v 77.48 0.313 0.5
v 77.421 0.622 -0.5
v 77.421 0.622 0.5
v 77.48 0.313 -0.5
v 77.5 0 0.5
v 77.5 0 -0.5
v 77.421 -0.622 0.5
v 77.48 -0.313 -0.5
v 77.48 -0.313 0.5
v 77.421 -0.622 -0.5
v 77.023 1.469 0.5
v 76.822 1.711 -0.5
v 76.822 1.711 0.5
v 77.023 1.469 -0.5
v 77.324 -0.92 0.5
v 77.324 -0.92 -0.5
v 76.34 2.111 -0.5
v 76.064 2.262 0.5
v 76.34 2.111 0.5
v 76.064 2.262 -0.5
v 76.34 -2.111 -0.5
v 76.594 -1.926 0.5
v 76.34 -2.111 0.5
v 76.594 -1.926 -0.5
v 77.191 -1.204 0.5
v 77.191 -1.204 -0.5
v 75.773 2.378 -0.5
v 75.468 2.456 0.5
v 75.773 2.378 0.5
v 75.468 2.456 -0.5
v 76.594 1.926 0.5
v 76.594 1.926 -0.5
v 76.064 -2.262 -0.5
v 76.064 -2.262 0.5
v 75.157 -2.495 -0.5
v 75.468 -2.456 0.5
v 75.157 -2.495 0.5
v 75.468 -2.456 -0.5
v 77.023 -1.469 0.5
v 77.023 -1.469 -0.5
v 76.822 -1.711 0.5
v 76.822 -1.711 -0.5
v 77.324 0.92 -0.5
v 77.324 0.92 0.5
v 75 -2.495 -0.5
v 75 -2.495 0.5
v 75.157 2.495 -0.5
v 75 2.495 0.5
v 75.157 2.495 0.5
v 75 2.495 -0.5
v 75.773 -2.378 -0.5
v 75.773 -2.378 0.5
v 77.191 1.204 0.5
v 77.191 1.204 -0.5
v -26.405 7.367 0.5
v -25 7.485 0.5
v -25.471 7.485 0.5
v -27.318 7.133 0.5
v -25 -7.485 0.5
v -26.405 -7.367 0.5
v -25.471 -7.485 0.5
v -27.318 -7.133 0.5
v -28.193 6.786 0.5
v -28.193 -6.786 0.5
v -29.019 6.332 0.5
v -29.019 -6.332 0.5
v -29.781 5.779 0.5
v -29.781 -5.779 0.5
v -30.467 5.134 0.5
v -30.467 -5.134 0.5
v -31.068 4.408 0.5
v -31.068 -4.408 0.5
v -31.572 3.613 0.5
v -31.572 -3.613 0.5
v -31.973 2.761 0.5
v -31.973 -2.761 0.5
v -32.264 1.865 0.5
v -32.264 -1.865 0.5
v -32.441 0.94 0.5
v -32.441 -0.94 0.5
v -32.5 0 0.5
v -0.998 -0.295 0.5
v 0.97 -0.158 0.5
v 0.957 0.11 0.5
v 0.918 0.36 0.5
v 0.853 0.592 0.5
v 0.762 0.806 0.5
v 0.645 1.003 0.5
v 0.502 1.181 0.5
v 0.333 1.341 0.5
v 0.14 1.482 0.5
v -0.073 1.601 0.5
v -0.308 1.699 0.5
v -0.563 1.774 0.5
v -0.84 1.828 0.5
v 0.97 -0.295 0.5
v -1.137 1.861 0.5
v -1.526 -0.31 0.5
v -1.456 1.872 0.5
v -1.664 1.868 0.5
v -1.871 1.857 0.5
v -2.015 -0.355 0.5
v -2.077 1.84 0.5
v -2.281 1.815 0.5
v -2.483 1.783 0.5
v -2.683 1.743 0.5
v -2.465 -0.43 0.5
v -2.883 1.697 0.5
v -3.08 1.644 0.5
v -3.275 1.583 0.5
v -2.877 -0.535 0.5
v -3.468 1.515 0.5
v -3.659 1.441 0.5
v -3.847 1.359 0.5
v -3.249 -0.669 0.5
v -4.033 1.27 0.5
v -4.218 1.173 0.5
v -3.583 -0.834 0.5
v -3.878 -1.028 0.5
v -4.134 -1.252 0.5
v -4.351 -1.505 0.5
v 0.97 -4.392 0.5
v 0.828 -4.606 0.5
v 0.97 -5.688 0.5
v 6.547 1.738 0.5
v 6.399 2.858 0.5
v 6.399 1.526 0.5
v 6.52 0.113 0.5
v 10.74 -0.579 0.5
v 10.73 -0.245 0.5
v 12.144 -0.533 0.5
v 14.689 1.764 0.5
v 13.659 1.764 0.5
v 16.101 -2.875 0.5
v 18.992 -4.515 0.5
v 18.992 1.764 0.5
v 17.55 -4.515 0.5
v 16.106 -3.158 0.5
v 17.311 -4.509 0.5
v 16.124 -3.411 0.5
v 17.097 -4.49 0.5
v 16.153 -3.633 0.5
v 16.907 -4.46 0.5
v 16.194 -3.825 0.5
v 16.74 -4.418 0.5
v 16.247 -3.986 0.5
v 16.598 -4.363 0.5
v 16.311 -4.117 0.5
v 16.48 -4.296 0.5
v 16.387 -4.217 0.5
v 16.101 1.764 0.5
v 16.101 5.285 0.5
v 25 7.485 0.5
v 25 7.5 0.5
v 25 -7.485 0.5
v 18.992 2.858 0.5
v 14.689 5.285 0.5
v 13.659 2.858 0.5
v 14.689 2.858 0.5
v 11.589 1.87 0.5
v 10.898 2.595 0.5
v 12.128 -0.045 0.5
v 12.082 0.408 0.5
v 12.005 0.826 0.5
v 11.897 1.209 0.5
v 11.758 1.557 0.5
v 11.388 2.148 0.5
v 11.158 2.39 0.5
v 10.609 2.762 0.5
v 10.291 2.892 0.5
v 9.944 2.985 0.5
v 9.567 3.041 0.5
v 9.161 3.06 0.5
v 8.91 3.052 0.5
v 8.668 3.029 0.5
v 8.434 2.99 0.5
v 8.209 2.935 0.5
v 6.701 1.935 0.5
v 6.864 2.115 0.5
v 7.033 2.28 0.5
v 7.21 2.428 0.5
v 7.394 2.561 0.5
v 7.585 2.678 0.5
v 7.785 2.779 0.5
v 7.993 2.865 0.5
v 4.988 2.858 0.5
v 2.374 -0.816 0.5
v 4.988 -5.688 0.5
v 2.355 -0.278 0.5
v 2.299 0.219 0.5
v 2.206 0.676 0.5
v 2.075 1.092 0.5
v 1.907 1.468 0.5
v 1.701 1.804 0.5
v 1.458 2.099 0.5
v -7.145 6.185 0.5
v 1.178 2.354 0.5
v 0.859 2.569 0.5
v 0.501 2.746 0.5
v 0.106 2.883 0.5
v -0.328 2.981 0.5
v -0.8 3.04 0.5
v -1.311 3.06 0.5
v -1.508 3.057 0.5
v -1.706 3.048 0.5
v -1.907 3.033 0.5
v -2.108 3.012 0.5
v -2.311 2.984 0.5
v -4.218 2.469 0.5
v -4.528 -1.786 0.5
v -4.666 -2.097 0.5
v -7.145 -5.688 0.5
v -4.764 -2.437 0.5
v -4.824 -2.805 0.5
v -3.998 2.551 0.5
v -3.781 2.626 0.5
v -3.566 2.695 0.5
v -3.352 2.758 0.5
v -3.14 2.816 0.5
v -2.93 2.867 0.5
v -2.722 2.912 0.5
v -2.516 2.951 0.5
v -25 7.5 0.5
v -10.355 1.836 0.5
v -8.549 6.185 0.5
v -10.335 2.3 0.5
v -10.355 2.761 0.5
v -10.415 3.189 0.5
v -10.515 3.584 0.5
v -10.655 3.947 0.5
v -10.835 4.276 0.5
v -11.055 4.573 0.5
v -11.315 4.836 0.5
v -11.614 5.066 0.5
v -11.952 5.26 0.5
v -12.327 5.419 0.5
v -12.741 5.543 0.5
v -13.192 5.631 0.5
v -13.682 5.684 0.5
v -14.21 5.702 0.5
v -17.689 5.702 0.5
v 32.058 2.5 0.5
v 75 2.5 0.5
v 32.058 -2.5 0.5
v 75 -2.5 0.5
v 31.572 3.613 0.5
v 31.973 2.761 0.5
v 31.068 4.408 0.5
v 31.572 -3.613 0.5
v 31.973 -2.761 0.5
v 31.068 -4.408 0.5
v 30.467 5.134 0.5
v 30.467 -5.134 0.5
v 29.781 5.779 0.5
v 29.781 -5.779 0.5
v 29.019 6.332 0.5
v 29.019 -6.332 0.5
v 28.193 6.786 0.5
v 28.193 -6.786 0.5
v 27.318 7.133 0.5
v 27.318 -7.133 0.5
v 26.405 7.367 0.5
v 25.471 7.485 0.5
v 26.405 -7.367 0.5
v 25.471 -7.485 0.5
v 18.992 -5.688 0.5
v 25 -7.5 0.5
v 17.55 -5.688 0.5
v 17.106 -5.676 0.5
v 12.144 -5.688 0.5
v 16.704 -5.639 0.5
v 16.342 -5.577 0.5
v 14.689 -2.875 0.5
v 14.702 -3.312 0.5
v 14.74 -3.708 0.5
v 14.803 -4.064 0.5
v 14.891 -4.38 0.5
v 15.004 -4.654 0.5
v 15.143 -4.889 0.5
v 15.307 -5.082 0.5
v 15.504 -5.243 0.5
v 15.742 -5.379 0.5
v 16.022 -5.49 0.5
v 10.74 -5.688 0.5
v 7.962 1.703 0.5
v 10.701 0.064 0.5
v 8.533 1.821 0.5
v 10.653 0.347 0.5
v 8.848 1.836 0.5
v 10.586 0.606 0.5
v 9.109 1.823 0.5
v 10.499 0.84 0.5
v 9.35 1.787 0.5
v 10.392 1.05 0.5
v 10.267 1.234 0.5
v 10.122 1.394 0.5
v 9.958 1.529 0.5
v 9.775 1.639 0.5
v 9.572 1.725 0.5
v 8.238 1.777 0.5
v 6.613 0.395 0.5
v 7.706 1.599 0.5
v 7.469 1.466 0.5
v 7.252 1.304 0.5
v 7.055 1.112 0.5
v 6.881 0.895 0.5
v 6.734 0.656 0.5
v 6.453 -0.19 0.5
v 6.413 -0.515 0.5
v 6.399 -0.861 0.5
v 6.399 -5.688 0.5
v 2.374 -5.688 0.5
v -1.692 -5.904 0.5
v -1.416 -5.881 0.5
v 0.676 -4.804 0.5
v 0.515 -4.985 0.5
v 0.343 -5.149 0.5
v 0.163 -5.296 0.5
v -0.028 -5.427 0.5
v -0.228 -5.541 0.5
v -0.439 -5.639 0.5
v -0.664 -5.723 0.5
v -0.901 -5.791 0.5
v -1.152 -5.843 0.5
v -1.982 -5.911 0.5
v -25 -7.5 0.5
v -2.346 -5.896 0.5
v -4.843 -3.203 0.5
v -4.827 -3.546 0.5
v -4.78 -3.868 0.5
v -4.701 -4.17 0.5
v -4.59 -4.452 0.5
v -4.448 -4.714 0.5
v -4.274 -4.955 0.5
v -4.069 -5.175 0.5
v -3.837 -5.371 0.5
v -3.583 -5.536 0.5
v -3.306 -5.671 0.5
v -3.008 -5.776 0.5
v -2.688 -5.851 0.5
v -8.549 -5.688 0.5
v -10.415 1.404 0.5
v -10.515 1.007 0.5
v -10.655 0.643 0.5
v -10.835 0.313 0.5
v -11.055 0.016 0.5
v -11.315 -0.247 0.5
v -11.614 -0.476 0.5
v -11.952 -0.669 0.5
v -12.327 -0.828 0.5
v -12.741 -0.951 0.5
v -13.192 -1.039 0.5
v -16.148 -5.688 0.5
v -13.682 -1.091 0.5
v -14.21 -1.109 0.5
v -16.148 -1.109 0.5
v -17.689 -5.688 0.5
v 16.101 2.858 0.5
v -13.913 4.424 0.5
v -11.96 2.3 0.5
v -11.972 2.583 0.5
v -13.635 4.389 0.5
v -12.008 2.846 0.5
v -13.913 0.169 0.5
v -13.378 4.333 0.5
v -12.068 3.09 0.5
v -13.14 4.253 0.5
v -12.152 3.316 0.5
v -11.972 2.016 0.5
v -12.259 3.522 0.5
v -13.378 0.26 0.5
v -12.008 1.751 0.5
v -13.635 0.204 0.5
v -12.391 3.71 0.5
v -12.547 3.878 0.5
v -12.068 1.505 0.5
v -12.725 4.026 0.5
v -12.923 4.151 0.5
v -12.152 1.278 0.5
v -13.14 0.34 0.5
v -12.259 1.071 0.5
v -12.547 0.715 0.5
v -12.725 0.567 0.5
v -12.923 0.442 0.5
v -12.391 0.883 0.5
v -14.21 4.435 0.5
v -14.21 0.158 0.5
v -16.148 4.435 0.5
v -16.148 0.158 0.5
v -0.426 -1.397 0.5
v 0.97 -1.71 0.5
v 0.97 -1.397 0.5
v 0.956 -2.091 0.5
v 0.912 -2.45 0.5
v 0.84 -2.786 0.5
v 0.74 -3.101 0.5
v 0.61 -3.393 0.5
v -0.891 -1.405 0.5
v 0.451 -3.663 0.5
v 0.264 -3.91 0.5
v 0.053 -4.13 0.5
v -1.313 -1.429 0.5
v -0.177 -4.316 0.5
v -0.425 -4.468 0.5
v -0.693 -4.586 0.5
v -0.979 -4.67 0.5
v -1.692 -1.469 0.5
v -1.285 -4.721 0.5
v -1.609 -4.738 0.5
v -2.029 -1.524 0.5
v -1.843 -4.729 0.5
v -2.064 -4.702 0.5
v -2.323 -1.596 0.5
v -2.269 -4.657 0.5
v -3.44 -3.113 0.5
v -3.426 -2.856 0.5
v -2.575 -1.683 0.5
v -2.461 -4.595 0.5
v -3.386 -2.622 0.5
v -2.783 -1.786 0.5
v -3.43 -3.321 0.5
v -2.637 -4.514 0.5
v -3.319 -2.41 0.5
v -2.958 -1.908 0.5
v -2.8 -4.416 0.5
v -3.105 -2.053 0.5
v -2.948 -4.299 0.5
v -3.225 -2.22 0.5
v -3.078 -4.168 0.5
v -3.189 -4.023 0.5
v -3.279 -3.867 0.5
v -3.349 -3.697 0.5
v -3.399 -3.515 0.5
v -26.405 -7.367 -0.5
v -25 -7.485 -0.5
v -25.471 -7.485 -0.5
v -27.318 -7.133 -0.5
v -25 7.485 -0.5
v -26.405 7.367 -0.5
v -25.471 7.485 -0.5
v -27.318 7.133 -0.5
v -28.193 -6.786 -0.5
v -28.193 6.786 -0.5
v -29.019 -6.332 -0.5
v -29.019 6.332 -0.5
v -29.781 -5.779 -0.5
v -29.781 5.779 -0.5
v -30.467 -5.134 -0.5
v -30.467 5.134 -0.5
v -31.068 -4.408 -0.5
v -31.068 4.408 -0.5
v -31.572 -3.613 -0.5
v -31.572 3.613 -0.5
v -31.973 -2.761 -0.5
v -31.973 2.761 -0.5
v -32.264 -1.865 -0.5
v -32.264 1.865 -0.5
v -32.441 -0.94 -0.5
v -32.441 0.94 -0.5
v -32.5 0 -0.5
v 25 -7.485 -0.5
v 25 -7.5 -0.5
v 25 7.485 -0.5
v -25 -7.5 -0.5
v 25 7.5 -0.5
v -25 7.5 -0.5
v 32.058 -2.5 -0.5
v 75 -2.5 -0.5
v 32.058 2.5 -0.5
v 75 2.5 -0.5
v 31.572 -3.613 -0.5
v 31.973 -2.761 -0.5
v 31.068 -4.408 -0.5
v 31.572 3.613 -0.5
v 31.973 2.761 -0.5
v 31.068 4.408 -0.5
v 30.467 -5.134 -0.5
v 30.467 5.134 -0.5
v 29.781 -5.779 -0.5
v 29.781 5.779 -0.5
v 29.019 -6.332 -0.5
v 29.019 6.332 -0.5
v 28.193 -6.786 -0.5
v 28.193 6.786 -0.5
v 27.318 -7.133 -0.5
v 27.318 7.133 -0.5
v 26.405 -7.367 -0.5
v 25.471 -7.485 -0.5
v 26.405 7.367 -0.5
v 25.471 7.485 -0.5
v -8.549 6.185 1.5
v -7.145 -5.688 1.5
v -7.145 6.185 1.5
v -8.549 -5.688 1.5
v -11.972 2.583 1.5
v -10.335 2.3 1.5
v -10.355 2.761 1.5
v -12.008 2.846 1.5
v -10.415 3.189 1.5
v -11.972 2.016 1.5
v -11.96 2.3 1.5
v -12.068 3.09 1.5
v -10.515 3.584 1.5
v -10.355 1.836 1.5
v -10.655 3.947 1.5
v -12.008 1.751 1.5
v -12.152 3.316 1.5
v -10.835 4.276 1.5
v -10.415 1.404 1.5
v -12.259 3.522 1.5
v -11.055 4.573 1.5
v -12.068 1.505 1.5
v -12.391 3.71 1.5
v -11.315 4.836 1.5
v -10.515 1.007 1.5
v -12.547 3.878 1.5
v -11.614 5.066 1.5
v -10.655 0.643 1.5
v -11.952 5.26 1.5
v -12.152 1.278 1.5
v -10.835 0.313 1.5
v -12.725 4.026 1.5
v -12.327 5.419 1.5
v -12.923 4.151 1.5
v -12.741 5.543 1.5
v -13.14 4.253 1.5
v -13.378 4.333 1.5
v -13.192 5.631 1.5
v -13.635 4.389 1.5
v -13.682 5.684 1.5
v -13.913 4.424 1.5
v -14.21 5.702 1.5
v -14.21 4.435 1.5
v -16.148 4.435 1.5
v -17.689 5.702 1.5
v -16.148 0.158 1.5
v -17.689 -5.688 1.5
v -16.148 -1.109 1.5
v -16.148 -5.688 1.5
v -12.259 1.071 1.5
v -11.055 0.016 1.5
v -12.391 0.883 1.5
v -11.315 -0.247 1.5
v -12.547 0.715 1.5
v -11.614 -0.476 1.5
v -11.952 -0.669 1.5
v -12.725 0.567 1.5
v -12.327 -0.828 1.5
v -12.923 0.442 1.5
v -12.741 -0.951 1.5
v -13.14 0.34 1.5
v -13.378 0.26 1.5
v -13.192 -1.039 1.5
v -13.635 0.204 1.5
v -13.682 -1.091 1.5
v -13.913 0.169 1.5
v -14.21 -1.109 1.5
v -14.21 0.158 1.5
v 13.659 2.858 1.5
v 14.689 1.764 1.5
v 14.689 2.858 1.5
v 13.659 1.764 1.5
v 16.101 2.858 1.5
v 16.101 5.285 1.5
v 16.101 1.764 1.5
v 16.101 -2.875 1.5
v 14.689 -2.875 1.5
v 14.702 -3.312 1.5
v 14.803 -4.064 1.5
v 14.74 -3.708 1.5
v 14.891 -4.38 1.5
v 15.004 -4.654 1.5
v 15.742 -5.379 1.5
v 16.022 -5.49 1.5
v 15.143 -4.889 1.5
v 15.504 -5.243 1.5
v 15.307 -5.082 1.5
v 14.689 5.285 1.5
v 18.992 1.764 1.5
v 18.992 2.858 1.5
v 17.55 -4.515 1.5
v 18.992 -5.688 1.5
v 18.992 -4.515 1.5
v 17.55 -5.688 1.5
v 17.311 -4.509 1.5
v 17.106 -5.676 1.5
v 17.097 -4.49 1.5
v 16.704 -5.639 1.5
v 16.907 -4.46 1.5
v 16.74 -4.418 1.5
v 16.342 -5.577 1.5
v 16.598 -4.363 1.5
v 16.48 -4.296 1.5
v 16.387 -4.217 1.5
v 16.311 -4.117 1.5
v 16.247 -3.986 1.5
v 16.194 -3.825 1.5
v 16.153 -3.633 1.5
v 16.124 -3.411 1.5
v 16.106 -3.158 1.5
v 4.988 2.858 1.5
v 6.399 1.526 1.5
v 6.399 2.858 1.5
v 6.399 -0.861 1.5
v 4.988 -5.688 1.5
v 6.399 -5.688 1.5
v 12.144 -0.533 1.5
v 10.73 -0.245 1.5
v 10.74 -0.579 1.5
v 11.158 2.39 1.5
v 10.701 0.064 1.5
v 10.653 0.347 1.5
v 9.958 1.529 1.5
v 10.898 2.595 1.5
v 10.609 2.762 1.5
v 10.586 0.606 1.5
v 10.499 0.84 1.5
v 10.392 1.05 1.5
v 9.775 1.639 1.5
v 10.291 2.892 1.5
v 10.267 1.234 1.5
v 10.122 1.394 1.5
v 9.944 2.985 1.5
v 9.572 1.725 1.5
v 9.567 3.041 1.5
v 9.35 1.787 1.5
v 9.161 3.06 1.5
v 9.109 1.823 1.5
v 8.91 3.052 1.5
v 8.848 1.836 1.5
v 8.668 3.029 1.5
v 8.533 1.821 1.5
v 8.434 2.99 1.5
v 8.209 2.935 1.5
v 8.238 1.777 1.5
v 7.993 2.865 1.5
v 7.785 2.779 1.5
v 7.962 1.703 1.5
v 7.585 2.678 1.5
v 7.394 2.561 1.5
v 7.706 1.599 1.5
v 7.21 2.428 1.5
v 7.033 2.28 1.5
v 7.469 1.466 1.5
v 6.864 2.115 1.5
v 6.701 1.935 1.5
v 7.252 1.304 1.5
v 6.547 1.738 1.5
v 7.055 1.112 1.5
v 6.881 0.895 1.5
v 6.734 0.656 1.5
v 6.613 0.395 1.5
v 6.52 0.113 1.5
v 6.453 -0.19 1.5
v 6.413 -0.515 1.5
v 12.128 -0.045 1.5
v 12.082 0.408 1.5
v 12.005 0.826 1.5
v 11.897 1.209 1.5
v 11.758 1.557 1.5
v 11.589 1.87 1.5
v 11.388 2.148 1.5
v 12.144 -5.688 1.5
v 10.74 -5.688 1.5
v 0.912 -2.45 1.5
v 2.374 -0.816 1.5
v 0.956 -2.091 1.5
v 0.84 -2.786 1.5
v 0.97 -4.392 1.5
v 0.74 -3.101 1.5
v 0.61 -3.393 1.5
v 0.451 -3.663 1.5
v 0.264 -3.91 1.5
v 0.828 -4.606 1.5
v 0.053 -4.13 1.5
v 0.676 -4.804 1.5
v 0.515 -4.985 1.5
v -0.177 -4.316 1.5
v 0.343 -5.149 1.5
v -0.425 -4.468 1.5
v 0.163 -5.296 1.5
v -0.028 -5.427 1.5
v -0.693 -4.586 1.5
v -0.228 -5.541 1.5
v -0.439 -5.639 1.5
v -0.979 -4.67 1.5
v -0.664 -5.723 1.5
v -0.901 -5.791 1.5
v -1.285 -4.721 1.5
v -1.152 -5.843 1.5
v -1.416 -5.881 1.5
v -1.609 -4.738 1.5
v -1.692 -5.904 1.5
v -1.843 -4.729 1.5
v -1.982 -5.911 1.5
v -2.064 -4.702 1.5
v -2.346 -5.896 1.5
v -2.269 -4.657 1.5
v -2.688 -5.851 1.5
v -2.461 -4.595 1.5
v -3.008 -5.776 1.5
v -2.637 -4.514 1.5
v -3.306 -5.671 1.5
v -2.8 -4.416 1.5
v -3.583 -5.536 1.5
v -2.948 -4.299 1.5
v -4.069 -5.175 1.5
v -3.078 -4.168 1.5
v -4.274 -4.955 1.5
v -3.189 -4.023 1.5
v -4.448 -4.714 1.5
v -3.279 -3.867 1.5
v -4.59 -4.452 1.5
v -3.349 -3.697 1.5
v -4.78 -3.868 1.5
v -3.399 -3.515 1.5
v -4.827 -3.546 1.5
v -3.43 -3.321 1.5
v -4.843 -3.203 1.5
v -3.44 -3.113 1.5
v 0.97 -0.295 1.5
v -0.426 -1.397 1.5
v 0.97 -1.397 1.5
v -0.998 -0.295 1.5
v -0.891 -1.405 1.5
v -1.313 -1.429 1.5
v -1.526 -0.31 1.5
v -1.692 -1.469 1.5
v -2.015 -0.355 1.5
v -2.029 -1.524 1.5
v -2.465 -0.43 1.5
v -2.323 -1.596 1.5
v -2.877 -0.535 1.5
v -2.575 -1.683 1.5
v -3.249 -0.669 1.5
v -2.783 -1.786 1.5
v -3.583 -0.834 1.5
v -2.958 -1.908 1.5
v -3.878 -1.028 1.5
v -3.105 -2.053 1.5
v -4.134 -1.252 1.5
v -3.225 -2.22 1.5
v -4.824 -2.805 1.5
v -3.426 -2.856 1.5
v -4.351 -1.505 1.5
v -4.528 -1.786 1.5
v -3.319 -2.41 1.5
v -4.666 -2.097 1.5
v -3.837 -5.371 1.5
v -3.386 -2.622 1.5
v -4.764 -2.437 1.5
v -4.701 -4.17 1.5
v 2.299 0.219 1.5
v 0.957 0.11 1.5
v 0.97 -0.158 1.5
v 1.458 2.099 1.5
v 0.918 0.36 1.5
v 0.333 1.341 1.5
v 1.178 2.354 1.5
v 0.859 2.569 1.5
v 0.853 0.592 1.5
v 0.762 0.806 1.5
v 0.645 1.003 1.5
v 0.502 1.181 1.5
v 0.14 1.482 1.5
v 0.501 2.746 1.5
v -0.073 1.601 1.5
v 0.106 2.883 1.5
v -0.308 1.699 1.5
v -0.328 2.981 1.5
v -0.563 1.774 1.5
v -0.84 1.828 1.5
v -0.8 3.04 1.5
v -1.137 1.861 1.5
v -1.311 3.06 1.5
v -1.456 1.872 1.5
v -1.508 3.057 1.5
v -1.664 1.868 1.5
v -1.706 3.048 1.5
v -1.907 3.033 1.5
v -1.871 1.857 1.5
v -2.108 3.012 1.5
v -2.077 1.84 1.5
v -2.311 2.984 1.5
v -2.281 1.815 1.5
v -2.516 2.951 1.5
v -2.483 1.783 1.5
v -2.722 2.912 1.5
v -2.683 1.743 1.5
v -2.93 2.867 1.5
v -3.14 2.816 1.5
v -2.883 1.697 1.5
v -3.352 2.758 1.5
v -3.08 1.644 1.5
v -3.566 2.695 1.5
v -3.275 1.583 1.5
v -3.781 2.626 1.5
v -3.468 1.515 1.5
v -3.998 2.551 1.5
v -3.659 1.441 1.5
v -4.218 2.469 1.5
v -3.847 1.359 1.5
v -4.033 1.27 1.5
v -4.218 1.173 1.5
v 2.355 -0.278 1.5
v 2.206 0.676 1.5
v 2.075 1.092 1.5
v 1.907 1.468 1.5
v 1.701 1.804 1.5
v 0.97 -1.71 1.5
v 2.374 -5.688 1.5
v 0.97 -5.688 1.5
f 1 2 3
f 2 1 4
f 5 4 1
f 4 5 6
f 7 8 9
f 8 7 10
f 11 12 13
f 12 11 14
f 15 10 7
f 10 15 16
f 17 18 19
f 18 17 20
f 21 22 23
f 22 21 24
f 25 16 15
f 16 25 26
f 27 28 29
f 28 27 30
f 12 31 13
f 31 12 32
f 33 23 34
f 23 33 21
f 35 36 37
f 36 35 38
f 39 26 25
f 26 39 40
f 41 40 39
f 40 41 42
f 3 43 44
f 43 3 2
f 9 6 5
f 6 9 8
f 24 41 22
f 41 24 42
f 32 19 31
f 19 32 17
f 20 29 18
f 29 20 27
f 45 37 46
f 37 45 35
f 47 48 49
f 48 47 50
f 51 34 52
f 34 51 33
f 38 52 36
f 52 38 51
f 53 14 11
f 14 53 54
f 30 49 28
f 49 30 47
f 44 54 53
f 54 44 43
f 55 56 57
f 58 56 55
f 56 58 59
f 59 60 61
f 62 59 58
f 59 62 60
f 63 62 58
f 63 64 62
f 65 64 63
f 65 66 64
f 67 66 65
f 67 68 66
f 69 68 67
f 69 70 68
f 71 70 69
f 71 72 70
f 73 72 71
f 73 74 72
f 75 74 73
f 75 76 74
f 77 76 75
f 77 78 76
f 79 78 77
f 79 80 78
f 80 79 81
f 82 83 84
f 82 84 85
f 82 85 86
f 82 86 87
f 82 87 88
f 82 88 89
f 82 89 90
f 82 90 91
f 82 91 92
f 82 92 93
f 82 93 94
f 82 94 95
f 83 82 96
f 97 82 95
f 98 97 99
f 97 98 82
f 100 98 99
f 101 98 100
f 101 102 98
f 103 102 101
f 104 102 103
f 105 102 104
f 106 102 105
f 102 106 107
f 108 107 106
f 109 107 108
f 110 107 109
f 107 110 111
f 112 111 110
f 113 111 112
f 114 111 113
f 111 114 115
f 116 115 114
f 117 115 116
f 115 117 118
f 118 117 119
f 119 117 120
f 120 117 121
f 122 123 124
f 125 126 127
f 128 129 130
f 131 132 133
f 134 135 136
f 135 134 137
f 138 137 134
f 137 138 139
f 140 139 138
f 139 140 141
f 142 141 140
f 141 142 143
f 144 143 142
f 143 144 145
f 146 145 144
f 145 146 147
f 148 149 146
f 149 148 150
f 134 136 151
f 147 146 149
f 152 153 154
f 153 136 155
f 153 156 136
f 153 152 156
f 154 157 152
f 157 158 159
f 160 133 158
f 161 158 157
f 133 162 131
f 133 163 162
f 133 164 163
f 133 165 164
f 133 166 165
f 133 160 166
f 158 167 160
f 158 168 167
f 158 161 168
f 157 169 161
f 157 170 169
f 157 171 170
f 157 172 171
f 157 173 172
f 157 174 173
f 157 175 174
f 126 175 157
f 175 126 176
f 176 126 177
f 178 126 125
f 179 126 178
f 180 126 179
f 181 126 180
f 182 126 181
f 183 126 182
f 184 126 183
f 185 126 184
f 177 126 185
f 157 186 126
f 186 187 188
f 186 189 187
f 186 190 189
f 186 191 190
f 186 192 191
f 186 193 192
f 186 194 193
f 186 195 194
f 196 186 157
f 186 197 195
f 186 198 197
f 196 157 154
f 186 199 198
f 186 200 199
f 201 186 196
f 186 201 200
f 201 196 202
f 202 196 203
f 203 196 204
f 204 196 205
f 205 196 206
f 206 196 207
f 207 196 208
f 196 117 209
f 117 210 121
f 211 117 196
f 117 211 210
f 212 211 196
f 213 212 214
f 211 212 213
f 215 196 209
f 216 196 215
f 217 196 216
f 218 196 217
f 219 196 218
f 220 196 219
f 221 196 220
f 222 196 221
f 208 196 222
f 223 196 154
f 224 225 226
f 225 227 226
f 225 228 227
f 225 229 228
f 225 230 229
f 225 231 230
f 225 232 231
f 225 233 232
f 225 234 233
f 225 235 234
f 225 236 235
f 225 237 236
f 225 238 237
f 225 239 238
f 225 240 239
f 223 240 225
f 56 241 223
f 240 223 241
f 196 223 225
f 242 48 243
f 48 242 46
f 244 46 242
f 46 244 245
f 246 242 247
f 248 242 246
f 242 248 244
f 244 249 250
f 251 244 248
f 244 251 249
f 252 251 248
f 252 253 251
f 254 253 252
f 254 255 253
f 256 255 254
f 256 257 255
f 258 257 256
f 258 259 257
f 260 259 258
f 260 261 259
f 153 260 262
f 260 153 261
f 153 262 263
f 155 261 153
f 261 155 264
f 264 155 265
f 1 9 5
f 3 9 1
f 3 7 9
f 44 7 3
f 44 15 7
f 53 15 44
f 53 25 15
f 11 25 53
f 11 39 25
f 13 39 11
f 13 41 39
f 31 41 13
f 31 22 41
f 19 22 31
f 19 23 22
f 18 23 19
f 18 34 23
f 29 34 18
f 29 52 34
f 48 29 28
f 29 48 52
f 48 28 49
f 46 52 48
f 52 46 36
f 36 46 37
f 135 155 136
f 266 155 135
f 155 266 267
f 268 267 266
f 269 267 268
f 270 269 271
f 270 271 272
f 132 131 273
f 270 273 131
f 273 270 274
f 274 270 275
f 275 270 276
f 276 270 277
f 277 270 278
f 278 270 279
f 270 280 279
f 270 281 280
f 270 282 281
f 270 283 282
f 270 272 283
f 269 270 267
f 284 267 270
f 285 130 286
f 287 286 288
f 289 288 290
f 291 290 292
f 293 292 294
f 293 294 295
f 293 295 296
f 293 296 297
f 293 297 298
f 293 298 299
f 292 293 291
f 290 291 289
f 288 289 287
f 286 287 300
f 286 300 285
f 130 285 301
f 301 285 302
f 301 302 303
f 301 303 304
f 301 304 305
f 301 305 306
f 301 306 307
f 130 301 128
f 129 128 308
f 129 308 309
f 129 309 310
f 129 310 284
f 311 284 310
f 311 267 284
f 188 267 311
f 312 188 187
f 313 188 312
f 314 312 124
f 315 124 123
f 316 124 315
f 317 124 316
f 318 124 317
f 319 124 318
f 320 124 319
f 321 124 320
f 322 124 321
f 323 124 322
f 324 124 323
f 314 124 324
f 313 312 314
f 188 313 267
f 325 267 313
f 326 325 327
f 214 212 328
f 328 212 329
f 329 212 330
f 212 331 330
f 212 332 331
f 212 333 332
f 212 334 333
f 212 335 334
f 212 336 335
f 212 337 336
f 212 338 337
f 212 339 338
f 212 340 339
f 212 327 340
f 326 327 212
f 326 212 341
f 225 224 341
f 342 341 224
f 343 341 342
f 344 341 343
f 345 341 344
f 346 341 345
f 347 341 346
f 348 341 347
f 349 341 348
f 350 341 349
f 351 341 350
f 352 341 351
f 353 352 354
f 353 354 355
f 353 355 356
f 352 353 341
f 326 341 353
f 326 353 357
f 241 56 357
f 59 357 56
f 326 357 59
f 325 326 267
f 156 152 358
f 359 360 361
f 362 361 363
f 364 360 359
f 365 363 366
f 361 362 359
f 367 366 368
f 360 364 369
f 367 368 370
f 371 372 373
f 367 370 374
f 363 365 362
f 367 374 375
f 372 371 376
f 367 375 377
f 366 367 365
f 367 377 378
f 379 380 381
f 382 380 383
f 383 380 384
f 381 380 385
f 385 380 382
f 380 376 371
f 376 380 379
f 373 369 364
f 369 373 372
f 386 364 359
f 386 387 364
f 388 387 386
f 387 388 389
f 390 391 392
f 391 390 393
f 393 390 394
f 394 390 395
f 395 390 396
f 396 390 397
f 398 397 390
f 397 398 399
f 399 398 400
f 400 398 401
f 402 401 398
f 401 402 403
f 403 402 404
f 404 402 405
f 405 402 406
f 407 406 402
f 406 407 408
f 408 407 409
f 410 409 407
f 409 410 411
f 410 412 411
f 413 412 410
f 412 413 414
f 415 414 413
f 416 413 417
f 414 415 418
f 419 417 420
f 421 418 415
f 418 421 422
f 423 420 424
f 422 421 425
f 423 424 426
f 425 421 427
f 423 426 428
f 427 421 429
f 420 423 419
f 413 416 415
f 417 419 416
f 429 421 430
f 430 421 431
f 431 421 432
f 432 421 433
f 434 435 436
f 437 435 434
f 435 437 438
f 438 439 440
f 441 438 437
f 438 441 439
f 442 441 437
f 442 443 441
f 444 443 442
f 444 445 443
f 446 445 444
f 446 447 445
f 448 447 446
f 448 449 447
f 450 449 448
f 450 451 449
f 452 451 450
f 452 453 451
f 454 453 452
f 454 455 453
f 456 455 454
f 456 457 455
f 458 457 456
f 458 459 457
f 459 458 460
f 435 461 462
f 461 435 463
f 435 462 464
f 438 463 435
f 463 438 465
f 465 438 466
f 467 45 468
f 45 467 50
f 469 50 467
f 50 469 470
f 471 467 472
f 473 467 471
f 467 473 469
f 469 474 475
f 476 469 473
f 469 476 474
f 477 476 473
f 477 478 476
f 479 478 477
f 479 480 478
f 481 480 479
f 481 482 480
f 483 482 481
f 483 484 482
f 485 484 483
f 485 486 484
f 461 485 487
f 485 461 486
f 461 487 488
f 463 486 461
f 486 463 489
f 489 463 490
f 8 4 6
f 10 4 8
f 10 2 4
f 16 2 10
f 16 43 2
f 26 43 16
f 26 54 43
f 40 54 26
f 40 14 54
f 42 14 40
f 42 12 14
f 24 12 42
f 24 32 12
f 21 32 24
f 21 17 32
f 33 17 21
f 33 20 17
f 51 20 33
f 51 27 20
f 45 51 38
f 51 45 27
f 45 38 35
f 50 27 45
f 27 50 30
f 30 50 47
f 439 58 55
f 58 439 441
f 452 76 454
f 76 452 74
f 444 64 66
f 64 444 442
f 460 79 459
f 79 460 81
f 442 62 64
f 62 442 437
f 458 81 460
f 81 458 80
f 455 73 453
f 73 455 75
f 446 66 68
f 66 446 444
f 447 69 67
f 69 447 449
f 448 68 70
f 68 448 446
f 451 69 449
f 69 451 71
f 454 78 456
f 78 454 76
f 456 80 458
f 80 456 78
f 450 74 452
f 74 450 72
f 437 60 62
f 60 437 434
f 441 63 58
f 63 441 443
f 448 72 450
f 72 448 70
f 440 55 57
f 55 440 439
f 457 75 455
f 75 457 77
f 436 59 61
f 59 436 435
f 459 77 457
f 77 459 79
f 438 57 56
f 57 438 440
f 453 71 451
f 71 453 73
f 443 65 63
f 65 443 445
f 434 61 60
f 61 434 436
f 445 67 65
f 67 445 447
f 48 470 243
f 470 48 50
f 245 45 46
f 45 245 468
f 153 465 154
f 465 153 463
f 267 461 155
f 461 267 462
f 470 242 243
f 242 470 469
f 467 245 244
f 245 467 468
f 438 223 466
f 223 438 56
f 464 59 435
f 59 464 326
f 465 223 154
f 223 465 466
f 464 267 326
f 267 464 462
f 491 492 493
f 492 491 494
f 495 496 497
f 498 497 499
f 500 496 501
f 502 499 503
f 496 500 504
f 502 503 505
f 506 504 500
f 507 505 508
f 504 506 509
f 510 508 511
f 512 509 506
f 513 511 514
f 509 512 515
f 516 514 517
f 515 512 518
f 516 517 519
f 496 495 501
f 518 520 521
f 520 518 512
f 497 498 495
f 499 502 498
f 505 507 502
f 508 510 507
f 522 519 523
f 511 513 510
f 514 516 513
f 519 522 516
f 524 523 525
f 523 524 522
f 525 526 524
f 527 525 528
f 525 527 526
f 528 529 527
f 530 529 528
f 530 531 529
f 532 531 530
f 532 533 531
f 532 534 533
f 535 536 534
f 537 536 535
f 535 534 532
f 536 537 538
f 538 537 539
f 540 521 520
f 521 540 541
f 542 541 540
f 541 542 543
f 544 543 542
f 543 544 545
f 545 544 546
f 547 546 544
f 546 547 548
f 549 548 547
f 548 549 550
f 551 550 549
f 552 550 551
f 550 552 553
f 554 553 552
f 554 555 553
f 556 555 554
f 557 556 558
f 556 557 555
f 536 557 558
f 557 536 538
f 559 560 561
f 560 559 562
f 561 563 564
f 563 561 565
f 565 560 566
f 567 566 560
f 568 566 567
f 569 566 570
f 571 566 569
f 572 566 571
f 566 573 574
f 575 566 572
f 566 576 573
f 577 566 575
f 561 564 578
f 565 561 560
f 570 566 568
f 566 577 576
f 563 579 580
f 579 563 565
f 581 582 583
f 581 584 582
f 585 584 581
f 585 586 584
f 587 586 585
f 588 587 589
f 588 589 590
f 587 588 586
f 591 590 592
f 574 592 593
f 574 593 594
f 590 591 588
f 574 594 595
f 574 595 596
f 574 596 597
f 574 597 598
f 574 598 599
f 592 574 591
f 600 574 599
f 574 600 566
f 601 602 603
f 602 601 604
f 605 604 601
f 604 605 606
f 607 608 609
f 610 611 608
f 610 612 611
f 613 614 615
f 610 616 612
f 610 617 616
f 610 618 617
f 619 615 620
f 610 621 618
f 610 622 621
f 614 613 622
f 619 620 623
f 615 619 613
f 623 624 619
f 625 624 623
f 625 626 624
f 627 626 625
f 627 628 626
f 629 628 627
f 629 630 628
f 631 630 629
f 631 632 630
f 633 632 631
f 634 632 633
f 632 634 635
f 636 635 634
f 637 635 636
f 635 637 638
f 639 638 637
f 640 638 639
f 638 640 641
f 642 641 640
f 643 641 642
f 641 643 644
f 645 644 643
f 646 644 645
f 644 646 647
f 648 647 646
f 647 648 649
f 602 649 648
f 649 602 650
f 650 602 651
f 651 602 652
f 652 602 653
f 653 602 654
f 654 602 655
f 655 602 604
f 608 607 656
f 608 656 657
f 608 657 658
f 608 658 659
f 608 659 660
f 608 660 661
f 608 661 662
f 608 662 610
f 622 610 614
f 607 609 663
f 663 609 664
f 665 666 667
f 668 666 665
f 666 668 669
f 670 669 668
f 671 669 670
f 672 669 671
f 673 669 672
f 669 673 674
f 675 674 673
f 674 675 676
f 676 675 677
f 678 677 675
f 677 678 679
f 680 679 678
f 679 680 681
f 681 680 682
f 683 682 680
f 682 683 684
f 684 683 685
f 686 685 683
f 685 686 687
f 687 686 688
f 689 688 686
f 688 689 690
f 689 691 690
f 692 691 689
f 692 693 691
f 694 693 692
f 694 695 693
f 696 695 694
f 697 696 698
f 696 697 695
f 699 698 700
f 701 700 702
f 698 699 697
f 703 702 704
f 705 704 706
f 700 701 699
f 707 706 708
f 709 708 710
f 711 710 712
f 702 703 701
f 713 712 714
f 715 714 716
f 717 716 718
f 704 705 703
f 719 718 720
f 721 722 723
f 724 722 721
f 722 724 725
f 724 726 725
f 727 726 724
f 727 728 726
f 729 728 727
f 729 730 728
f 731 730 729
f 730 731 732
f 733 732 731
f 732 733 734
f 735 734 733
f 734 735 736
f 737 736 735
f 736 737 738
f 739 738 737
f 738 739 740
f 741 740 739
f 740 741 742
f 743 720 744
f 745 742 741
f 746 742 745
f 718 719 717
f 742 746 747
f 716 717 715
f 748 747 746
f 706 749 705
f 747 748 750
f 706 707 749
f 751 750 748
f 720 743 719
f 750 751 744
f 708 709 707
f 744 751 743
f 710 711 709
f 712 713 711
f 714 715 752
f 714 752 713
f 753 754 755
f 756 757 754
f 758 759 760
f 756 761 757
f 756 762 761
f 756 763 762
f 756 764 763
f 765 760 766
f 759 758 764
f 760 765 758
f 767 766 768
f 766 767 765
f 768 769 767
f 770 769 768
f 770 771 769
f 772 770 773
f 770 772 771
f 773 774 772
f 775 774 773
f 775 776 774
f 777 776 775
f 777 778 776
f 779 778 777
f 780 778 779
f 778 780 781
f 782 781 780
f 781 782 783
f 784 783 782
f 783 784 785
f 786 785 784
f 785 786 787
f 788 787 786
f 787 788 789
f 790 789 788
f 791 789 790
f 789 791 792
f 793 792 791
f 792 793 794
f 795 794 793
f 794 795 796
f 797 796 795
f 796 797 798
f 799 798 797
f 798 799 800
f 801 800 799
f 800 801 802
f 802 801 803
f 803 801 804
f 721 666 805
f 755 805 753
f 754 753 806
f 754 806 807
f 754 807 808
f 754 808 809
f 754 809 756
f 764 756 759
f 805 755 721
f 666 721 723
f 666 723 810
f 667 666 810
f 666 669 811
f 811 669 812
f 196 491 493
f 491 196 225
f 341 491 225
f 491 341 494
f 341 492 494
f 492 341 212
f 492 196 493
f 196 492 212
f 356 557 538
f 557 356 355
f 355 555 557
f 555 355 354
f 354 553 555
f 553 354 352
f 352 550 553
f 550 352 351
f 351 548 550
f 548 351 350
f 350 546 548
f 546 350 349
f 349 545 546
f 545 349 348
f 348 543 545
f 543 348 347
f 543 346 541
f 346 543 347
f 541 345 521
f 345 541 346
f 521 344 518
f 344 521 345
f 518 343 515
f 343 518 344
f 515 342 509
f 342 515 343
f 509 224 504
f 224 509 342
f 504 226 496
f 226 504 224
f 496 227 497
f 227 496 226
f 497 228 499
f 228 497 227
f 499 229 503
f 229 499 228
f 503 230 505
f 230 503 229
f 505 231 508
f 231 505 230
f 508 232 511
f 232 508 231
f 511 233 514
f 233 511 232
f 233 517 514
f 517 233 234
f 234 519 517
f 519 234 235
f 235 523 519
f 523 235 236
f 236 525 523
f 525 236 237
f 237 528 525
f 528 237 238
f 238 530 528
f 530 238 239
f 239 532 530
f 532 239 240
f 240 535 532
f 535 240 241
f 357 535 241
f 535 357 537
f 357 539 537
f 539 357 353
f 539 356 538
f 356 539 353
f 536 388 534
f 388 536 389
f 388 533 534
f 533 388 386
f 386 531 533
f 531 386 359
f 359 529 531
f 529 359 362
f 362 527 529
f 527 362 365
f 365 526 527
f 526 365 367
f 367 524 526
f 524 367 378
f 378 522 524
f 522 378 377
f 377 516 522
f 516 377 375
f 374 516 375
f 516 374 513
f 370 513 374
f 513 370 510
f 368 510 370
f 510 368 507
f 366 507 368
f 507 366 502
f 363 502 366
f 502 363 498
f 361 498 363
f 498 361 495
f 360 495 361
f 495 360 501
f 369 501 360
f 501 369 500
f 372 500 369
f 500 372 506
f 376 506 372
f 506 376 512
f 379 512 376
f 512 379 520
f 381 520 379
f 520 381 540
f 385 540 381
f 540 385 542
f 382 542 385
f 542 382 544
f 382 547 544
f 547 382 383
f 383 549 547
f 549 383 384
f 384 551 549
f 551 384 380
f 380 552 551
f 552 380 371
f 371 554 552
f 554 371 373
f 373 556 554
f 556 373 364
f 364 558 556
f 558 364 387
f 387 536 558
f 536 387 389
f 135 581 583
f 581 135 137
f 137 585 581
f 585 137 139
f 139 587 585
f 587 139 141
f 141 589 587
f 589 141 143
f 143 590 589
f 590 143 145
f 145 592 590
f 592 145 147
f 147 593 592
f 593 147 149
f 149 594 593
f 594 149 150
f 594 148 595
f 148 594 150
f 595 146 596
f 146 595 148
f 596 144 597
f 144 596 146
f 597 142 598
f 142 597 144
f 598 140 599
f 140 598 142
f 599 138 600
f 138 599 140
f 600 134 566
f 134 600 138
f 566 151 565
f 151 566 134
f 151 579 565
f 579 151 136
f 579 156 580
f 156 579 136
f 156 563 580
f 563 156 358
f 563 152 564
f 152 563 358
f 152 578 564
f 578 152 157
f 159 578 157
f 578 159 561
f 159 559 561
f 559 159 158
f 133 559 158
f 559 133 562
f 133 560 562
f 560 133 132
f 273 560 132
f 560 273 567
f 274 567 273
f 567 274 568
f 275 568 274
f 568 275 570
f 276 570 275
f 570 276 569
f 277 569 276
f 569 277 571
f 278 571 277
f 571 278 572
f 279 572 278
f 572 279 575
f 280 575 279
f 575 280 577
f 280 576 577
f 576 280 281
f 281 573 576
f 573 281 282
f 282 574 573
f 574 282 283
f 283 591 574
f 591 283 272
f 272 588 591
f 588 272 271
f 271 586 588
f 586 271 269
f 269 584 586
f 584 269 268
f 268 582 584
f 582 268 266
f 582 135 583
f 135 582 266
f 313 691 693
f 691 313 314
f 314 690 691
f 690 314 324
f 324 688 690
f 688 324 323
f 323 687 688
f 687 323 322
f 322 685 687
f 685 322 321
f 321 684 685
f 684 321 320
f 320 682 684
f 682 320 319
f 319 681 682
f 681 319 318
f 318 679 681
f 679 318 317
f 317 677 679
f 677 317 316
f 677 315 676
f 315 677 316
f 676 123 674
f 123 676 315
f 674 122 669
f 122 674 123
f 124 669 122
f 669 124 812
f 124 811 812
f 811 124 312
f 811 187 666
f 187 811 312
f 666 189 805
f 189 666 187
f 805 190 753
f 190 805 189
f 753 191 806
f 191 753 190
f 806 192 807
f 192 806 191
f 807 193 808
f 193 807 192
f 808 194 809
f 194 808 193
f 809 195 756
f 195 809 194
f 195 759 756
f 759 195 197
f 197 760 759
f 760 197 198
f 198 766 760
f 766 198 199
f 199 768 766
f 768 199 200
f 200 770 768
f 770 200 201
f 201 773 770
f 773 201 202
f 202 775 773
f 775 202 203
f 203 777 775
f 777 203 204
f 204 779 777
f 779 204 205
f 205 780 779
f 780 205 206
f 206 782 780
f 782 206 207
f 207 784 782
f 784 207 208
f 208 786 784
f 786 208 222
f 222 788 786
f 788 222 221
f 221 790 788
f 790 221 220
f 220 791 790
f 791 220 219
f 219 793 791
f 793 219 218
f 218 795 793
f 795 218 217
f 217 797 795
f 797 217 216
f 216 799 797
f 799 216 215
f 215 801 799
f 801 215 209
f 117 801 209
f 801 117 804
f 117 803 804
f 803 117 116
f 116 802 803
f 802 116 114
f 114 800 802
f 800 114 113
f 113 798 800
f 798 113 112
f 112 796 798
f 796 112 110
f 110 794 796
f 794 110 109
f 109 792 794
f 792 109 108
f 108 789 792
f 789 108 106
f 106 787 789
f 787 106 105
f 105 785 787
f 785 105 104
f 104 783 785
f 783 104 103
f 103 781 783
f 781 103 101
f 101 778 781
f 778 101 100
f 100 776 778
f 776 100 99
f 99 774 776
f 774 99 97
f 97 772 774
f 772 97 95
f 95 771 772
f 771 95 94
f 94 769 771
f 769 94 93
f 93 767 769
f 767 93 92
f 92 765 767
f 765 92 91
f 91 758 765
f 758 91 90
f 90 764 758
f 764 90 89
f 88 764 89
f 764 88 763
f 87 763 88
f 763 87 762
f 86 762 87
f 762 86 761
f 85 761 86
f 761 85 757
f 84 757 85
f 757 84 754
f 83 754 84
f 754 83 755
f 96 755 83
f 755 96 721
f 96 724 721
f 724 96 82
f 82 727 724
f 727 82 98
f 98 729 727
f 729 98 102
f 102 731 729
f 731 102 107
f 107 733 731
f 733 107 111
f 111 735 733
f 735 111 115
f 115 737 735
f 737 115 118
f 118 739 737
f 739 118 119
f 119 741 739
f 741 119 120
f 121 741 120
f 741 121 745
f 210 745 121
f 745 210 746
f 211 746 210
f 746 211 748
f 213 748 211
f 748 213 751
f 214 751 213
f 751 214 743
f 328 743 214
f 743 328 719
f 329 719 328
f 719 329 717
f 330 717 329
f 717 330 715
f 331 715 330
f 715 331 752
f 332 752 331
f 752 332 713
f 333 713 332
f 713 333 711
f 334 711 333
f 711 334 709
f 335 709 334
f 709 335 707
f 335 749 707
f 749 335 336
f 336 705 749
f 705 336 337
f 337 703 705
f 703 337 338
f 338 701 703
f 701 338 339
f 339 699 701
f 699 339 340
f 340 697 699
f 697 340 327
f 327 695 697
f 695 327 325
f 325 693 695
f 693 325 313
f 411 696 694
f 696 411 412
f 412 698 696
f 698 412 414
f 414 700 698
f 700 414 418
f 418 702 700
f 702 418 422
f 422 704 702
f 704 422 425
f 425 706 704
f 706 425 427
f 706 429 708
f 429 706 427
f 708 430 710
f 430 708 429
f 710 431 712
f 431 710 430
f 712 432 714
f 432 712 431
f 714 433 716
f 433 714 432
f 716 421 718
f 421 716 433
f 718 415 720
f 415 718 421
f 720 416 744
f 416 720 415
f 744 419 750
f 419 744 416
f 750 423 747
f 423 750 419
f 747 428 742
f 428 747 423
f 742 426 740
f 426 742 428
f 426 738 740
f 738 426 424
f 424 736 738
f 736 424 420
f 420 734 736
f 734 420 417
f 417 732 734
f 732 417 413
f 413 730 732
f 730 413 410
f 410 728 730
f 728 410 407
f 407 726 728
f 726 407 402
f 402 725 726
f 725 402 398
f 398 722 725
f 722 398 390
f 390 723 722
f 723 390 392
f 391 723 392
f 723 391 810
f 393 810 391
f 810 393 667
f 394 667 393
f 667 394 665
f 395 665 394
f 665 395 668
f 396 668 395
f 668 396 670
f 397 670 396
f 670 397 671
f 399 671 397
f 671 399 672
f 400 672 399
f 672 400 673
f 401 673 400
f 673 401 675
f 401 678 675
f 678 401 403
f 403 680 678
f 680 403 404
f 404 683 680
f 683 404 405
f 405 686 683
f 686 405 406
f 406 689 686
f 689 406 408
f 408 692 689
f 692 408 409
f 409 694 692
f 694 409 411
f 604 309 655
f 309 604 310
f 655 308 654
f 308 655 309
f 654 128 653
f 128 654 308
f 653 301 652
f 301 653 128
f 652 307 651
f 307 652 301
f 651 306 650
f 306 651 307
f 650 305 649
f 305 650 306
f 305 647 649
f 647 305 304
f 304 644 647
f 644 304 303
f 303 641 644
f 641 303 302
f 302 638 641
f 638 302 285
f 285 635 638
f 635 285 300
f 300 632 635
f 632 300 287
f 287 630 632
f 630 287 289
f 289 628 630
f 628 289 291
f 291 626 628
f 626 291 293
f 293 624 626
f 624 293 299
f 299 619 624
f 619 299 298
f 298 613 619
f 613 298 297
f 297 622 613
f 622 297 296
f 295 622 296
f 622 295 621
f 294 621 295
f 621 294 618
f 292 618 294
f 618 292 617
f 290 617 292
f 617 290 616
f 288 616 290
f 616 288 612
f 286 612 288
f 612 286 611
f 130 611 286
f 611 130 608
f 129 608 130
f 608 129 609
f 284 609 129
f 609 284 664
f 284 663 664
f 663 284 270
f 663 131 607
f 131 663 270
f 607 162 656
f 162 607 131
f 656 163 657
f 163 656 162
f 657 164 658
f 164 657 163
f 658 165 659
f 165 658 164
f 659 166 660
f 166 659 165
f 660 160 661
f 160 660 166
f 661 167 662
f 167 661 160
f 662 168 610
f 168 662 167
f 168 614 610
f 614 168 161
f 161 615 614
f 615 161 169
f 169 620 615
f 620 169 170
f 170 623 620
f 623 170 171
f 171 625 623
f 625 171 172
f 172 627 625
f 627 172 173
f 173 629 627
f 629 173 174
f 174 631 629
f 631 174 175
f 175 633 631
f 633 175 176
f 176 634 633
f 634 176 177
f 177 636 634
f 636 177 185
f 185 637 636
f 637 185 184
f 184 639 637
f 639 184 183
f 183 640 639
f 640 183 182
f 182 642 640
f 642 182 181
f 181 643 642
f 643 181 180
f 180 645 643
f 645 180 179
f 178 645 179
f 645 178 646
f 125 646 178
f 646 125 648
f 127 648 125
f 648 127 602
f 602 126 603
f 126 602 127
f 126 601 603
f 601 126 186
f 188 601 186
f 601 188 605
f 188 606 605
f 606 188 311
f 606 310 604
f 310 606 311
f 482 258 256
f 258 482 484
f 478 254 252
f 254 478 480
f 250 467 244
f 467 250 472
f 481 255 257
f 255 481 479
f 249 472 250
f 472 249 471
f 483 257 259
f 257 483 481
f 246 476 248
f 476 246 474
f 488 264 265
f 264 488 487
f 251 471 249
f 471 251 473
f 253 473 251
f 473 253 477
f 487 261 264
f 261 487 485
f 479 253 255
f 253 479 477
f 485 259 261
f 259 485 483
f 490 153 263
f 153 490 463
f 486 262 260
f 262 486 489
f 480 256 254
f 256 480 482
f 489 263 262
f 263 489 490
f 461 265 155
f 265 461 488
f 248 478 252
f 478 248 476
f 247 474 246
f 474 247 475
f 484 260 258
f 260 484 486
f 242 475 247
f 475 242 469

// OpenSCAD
//hight of the text in mm
Text_hight = 2;
// Text size
Text_size = 15;
// Text itself
Text = "Plant";
// hight of the label
height = 1;
// width of the label in mm
label_width = 15;
// length of the label in mm
label_length = 50;
// width of the earth stick in mm
earth_stick_witdth = 5;
// length of the earthstick in mm
earth_stick_length = 50;
union(){
  translate([((label_length + earth_stick_length) / 2), 0, 0]){
    cube([earth_stick_length, earth_stick_witdth, height], center=true);
  }
  cube([label_length, label_width, height], center=true);
  // size is multiplied by 0.75 because openScad font sizes are in points, not pixels
  linear_extrude( height=(Text_hight + height)/2, twist=0, center=false){
    text(str(Text), font = "Roboto", size = Text_size *0.75, halign="center", valign="center");
  }

  {
    $fn=50;    //set sides to 50
    translate([((label_length + 0) / 2 + earth_stick_length), 0, 0]){
      union(){
        linear_extrude( height=(height / 2), twist=0, scale=[1, 1], center=false){
          circle(r=(earth_stick_witdth / 2));
        }
        linear_extrude( height=(height), twist=0, scale=[1, 1], center=true){
          circle(r=(earth_stick_witdth / 2));
        }
      }
    }
  }
  {
    $fn=50;    //set sides to 50
    translate([((label_length + 0) / 2), 0, 0]){
      union(){
        linear_extrude( height=(height), twist=0, scale=[1, 1], center=true){
          circle(r=(label_width / 2));
        }
        linear_extrude( height=(height), twist=0, scale=[1, 1], center=true){
          circle(r=(label_width / -2));
        }
      }
    }
  }
  {
    $fn=50;    //set sides to 50
    translate([((label_length + 0) / -2), 0, 0]){
      union(){
        linear_extrude( height=(height / 2), twist=0, scale=[1, 1], center=false){
          circle(r=(label_width / 2));
        }
        linear_extrude( height=(height), twist=0, scale=[1, 1], center=true){
          circle(r=(label_width / 2));
        }
      }
    }
  }
}
